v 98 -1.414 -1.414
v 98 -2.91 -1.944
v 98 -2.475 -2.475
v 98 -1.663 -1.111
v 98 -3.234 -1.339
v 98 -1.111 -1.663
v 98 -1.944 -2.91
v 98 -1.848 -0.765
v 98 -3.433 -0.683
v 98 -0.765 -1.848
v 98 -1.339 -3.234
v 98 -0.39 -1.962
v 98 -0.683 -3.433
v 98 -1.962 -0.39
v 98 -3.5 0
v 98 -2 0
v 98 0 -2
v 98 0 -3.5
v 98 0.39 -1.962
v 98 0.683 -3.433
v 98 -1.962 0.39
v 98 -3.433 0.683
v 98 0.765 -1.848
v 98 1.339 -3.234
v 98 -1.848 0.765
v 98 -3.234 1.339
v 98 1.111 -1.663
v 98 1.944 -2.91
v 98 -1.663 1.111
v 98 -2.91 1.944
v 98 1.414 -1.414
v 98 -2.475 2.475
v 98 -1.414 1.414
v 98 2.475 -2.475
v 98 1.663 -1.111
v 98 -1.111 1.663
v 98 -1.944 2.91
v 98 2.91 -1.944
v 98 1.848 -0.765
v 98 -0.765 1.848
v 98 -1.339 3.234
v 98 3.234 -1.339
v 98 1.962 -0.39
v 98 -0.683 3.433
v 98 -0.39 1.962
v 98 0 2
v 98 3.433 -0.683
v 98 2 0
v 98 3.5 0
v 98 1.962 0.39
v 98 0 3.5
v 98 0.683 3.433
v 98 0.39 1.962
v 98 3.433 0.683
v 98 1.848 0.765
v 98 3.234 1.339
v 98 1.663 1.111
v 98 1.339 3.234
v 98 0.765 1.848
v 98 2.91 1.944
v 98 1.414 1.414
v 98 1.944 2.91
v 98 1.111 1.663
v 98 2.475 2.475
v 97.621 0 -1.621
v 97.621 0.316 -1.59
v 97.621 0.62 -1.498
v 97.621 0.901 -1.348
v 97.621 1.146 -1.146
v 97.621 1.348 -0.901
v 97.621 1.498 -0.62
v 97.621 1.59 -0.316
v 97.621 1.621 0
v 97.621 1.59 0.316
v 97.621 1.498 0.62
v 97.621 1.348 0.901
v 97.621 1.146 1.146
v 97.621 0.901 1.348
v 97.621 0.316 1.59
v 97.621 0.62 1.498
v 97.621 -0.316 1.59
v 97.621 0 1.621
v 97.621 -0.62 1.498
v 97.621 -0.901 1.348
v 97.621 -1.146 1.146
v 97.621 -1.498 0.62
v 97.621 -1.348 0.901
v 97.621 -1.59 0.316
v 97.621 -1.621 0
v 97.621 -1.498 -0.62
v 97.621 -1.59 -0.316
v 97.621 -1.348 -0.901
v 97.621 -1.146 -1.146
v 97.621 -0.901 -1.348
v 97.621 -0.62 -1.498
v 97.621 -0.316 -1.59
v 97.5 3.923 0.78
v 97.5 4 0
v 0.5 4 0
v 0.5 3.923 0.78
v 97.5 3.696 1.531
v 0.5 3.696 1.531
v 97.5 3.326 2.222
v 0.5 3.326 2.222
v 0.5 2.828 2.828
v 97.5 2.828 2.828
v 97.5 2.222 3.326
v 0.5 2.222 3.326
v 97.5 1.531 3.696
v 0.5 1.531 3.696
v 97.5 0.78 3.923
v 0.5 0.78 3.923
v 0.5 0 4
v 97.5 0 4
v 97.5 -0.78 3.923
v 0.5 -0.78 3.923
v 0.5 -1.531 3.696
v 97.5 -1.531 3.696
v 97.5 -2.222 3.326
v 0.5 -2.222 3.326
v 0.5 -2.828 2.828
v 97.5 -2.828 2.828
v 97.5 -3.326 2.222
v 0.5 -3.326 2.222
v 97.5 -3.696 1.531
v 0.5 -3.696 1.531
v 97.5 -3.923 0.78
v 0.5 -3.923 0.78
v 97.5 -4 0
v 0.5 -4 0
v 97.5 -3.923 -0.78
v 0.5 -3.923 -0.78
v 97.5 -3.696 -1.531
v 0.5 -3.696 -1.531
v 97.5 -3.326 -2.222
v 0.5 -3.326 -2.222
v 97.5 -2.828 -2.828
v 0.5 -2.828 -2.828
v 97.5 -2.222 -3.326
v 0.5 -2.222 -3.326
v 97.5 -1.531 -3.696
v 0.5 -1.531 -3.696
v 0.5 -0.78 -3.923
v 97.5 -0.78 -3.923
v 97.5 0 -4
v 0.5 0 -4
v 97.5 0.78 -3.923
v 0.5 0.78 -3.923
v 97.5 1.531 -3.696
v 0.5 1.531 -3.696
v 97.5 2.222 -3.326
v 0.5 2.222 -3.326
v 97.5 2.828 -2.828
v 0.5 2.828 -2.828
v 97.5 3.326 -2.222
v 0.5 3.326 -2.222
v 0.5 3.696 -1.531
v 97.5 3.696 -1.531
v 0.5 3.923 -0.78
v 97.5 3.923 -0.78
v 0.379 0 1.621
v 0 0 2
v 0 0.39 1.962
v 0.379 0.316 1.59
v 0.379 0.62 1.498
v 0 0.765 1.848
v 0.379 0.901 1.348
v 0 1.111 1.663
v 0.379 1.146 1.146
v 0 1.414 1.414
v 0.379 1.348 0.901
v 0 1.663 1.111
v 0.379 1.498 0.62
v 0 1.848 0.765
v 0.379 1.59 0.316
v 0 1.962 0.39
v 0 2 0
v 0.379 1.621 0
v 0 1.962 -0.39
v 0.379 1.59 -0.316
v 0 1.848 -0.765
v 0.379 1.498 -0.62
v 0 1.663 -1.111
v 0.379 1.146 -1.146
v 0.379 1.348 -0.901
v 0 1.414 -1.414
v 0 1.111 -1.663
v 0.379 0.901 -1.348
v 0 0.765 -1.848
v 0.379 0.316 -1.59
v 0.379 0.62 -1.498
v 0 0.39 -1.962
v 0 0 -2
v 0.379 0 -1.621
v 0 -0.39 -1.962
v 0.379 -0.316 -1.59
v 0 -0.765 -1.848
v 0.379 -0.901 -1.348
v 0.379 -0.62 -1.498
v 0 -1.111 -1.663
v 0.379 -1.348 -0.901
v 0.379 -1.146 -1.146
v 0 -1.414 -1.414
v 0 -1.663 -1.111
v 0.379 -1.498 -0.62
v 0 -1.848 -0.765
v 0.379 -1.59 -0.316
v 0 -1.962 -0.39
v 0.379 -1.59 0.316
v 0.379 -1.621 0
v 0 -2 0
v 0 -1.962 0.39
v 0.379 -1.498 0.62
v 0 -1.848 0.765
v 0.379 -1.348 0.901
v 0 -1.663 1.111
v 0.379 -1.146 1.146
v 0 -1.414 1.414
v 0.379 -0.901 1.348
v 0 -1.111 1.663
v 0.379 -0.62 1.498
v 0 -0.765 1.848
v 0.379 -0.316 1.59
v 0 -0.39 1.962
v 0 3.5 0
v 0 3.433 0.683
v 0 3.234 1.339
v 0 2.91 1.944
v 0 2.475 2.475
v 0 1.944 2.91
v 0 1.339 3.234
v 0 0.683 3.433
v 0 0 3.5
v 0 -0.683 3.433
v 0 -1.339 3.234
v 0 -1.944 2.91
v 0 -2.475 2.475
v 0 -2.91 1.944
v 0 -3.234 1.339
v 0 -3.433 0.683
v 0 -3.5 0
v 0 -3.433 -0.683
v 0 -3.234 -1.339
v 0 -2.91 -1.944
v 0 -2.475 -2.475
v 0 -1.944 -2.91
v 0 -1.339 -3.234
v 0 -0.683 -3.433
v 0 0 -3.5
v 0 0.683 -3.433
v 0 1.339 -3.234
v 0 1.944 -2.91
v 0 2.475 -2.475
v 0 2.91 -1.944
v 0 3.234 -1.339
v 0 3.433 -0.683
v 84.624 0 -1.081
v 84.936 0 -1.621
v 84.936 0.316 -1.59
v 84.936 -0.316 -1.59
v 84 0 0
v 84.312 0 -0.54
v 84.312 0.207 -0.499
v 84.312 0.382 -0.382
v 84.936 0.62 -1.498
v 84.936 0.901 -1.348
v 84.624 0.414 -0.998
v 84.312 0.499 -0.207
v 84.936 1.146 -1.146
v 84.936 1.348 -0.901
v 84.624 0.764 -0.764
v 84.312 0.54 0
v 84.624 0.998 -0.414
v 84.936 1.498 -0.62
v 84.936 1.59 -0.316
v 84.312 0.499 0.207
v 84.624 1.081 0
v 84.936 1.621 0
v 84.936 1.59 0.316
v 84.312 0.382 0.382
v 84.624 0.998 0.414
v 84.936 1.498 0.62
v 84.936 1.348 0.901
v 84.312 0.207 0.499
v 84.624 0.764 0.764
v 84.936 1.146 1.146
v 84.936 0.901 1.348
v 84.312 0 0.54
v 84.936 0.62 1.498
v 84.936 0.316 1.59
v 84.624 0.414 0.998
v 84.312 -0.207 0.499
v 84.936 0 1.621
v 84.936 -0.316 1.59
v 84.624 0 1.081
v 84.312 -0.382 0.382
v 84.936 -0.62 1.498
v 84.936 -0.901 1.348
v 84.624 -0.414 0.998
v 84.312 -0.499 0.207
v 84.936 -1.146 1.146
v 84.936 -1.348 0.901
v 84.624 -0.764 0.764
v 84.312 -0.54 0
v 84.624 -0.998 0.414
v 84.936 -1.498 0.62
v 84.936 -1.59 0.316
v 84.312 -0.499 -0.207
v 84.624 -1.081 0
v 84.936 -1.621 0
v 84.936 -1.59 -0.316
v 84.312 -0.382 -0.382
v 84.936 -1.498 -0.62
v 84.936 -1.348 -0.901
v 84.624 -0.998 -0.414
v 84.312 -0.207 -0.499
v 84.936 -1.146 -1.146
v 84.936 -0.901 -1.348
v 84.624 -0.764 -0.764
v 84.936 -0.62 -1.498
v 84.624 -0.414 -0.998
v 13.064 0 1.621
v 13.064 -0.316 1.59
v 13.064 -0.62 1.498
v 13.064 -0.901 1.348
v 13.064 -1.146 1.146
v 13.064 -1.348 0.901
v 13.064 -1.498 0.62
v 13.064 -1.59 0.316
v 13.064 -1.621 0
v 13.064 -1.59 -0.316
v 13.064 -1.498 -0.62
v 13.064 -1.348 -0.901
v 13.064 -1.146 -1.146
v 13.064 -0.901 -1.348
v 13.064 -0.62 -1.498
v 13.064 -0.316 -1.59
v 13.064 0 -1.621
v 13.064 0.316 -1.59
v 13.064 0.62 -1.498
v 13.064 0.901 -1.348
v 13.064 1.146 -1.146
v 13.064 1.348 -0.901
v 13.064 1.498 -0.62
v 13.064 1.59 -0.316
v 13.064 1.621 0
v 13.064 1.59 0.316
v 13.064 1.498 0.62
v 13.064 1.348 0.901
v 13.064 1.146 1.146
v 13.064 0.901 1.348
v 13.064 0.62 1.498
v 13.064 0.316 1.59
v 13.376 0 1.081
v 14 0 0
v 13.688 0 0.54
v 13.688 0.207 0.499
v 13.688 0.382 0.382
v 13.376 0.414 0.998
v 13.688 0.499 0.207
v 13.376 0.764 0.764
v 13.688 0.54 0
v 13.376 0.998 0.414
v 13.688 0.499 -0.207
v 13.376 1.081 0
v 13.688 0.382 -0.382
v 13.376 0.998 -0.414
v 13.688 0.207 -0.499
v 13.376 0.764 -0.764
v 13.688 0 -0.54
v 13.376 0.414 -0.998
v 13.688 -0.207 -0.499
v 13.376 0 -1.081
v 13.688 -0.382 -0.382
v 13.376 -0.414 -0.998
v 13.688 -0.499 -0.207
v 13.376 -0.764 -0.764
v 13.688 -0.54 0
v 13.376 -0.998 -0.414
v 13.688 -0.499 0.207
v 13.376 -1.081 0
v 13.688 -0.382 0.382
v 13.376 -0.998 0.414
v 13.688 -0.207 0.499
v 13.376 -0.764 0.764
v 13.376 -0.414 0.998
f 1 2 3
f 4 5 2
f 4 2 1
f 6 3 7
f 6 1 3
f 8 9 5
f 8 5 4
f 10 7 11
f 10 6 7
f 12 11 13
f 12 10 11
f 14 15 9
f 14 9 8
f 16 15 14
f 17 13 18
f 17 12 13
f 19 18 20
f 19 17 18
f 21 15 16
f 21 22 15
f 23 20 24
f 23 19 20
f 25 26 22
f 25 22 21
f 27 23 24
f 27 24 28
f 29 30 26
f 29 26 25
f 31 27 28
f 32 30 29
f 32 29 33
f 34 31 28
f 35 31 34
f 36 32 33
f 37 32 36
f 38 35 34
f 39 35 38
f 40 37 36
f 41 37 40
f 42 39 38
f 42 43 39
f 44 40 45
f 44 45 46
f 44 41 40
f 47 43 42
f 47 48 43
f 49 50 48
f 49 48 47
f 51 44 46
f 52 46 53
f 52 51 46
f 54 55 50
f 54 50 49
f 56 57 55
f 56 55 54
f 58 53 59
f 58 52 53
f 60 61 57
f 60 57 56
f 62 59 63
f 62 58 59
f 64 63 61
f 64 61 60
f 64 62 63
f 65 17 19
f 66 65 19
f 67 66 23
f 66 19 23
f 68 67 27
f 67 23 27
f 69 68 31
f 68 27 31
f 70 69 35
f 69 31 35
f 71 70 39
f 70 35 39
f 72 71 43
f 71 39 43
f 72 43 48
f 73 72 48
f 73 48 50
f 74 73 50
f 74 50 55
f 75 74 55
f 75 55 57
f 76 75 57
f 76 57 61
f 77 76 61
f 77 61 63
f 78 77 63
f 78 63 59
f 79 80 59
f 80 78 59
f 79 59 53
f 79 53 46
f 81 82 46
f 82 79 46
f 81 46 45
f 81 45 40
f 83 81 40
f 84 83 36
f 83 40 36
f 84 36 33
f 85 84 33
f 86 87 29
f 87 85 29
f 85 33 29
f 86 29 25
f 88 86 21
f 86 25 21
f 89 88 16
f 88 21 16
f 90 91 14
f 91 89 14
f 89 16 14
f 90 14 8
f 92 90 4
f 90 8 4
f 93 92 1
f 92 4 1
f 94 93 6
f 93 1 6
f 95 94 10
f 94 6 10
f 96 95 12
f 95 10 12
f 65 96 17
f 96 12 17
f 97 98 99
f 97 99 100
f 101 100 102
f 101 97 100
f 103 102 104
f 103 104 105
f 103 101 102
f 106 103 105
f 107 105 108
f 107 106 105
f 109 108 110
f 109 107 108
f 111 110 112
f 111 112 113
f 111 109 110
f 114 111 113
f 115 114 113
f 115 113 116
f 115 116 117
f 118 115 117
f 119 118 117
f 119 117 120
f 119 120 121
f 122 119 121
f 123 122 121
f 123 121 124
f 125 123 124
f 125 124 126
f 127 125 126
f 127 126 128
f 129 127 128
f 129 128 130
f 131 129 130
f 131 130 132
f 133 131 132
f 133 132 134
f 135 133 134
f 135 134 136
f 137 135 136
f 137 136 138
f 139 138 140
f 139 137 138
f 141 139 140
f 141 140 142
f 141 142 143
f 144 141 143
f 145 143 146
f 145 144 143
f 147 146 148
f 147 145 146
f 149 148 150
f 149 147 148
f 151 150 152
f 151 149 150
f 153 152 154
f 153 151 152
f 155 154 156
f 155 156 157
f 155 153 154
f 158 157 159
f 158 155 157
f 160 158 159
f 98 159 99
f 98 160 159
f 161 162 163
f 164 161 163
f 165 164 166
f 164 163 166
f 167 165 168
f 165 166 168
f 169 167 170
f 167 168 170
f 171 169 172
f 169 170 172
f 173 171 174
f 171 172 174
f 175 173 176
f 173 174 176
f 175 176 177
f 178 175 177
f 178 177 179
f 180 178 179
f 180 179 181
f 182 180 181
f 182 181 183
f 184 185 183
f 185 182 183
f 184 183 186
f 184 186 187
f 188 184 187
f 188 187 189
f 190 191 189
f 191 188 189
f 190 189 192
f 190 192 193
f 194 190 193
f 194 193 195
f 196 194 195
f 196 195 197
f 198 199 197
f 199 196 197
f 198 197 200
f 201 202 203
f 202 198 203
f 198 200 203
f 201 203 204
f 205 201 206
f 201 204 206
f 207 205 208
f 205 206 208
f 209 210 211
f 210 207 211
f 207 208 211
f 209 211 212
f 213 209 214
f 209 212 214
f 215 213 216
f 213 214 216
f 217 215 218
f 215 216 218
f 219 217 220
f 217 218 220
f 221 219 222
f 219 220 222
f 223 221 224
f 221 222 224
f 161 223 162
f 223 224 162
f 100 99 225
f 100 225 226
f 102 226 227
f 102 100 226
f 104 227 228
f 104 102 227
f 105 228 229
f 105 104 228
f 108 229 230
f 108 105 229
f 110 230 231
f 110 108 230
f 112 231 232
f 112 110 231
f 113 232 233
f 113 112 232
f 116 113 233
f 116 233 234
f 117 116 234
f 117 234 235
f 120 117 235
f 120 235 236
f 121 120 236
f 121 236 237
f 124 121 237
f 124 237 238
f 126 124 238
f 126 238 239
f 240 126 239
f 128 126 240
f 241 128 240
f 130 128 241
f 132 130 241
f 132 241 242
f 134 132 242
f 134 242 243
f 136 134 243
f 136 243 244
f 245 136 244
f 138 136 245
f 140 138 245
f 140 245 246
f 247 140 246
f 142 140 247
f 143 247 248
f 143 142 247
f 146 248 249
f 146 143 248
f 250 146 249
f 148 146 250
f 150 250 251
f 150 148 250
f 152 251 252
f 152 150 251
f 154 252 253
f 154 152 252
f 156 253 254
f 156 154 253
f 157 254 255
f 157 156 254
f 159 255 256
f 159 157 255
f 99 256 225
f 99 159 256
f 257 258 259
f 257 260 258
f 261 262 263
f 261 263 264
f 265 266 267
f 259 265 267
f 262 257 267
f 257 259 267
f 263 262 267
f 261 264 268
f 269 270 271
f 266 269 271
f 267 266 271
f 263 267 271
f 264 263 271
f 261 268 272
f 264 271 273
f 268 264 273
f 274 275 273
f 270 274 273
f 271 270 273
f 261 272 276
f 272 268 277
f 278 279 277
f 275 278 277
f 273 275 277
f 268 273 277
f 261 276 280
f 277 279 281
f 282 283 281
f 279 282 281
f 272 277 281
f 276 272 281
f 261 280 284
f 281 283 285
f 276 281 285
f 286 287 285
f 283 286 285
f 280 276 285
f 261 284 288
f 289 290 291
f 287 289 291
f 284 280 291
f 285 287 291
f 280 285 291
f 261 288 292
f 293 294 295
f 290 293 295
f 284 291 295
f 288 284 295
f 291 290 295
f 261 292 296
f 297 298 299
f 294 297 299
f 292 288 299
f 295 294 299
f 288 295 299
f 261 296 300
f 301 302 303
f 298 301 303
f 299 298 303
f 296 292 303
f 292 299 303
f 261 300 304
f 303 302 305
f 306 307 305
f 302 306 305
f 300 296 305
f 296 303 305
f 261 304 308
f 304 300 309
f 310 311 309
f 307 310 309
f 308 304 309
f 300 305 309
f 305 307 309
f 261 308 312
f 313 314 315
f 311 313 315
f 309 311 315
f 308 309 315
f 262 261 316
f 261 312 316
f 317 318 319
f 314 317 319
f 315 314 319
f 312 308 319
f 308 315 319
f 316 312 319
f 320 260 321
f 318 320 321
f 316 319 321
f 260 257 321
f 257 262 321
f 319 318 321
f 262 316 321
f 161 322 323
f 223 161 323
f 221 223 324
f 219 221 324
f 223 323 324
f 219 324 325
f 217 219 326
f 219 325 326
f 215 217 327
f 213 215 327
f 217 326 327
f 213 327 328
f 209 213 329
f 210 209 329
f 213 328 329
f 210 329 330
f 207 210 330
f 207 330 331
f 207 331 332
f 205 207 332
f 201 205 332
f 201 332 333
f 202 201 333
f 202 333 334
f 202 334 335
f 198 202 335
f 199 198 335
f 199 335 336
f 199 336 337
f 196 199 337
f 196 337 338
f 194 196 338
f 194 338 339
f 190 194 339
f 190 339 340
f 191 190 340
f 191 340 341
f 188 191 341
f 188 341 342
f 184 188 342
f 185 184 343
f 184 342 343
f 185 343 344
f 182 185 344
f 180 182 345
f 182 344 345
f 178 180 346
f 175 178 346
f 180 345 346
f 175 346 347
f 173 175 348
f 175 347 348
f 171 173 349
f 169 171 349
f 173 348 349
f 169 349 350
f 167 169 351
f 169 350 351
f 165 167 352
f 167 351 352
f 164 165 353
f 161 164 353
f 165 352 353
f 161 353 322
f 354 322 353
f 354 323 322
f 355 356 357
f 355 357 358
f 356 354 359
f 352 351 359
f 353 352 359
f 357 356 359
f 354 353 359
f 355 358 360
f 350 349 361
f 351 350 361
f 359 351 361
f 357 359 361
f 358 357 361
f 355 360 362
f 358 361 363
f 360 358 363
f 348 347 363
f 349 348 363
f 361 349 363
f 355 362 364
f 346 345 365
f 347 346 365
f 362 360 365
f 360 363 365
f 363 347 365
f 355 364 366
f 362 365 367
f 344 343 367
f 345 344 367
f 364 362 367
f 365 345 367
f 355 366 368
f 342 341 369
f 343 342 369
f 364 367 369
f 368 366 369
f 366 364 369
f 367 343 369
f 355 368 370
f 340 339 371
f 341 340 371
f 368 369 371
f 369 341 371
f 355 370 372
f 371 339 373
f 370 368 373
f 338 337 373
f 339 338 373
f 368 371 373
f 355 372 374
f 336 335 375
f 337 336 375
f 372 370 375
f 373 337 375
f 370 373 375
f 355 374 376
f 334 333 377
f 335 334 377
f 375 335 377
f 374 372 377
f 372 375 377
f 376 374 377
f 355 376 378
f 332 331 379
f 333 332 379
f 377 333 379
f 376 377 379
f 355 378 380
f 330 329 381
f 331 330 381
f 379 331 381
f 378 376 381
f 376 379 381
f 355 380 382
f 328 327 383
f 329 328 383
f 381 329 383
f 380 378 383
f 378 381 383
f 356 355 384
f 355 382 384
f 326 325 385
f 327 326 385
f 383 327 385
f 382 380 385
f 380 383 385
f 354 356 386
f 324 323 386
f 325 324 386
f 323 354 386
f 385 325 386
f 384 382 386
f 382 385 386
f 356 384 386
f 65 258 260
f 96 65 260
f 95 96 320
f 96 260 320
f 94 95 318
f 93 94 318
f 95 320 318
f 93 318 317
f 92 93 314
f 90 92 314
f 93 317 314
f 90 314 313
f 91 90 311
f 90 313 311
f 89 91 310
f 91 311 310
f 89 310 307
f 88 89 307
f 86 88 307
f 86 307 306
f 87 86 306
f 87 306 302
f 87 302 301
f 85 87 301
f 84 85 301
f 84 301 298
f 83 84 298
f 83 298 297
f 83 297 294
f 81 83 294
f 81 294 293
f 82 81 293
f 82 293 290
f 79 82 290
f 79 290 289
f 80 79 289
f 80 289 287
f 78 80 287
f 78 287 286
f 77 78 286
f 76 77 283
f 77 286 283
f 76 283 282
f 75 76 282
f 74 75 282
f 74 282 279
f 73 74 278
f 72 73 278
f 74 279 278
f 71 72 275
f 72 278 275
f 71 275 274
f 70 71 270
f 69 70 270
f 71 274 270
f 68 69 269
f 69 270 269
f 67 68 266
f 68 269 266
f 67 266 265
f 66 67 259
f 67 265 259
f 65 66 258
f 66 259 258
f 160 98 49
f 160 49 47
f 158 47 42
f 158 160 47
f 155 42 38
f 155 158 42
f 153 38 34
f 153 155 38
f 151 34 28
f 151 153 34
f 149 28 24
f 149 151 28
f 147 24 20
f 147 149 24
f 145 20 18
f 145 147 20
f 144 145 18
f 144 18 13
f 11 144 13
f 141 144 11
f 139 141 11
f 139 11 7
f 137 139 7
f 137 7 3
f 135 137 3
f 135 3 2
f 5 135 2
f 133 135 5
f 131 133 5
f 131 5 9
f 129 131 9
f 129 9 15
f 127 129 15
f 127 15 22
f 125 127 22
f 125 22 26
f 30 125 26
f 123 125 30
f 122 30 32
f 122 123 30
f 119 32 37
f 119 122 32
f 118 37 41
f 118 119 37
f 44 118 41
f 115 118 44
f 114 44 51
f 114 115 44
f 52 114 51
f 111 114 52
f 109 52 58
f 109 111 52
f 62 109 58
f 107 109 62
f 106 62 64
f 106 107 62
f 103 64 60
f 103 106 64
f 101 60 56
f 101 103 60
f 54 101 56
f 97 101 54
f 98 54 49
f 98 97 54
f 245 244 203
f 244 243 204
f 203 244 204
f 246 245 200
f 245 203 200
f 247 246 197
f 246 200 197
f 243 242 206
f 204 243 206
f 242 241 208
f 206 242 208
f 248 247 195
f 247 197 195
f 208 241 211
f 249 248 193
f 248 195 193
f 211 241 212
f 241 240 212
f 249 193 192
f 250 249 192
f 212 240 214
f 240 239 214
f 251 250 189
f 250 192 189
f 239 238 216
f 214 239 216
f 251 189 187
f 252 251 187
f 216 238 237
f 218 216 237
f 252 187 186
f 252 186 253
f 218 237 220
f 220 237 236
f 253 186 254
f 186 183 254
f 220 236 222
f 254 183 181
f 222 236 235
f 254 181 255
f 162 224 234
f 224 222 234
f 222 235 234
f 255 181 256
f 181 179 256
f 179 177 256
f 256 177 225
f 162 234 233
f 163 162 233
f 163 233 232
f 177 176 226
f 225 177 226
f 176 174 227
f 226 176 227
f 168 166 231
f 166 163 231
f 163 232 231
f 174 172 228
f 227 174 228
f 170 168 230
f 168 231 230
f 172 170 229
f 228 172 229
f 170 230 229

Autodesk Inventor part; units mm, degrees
ref_plane "YZ Plane" through (0, 0, 0) normal (1, 0, 0) x (0, 1, 0)
ref_plane "XZ Plane" through (0, 0, 0) normal (0, 1, 0) x (-1, 0, 0)
ref_plane "XY Plane" through (0, 0, 0) normal (0, 0, 1) x (1, 0, 0)
sketch "Sketch_1" plane through (0, 0, 0) normal (0, 0, 1) x (1, 0, 0)
  line L0 (98, 0) -> (0, 0)
  line L1 (0, 0) -> (0, 3.5)
  line L2 (0, 3.5) -> (0.5, 4)
  line L3 (0.5, 4) -> (97.5, 4)
  line L4 (97.5, 4) -> (98, 3.5)
  line L5 (98, 3.5) -> (98, 0)
  line L6 (98, 0) -> (0, 0)
revolve "Revolution1" add sketch "Sketch_1" angle 360 about axis through (98, 0, 0) along (1, 0, 0)
sketch "Sketch2" plane through (0, 0, 0) normal (-1, 0, 0) x (0, 0, 1)
  point P0 (0, 0)
hole "Hole1" at (0, 0, 0) direction (1, 0, 0) diameter 3.242 depth 13.0641 tip angle 120 countersink diameter 4 countersink angle 90 thread size "M4x0.7" class "6H" standard "ISO Metric profile"
sketch "Sketch3" plane through (98, 0, 0) normal (1, 0, 0) x (0, 0, -1)
  point P0 (0, 0)
hole "Hole2" at (98, 0, 0) direction (-1, 0, 0) diameter 3.242 depth 13.0641 tip angle 120 countersink diameter 4 countersink angle 90 thread size "M4x0.7" class "6H" standard "ISO Metric profile"
properties part number "SFHRW8-98-M4-N4" material "鋼、炭素鋼"
